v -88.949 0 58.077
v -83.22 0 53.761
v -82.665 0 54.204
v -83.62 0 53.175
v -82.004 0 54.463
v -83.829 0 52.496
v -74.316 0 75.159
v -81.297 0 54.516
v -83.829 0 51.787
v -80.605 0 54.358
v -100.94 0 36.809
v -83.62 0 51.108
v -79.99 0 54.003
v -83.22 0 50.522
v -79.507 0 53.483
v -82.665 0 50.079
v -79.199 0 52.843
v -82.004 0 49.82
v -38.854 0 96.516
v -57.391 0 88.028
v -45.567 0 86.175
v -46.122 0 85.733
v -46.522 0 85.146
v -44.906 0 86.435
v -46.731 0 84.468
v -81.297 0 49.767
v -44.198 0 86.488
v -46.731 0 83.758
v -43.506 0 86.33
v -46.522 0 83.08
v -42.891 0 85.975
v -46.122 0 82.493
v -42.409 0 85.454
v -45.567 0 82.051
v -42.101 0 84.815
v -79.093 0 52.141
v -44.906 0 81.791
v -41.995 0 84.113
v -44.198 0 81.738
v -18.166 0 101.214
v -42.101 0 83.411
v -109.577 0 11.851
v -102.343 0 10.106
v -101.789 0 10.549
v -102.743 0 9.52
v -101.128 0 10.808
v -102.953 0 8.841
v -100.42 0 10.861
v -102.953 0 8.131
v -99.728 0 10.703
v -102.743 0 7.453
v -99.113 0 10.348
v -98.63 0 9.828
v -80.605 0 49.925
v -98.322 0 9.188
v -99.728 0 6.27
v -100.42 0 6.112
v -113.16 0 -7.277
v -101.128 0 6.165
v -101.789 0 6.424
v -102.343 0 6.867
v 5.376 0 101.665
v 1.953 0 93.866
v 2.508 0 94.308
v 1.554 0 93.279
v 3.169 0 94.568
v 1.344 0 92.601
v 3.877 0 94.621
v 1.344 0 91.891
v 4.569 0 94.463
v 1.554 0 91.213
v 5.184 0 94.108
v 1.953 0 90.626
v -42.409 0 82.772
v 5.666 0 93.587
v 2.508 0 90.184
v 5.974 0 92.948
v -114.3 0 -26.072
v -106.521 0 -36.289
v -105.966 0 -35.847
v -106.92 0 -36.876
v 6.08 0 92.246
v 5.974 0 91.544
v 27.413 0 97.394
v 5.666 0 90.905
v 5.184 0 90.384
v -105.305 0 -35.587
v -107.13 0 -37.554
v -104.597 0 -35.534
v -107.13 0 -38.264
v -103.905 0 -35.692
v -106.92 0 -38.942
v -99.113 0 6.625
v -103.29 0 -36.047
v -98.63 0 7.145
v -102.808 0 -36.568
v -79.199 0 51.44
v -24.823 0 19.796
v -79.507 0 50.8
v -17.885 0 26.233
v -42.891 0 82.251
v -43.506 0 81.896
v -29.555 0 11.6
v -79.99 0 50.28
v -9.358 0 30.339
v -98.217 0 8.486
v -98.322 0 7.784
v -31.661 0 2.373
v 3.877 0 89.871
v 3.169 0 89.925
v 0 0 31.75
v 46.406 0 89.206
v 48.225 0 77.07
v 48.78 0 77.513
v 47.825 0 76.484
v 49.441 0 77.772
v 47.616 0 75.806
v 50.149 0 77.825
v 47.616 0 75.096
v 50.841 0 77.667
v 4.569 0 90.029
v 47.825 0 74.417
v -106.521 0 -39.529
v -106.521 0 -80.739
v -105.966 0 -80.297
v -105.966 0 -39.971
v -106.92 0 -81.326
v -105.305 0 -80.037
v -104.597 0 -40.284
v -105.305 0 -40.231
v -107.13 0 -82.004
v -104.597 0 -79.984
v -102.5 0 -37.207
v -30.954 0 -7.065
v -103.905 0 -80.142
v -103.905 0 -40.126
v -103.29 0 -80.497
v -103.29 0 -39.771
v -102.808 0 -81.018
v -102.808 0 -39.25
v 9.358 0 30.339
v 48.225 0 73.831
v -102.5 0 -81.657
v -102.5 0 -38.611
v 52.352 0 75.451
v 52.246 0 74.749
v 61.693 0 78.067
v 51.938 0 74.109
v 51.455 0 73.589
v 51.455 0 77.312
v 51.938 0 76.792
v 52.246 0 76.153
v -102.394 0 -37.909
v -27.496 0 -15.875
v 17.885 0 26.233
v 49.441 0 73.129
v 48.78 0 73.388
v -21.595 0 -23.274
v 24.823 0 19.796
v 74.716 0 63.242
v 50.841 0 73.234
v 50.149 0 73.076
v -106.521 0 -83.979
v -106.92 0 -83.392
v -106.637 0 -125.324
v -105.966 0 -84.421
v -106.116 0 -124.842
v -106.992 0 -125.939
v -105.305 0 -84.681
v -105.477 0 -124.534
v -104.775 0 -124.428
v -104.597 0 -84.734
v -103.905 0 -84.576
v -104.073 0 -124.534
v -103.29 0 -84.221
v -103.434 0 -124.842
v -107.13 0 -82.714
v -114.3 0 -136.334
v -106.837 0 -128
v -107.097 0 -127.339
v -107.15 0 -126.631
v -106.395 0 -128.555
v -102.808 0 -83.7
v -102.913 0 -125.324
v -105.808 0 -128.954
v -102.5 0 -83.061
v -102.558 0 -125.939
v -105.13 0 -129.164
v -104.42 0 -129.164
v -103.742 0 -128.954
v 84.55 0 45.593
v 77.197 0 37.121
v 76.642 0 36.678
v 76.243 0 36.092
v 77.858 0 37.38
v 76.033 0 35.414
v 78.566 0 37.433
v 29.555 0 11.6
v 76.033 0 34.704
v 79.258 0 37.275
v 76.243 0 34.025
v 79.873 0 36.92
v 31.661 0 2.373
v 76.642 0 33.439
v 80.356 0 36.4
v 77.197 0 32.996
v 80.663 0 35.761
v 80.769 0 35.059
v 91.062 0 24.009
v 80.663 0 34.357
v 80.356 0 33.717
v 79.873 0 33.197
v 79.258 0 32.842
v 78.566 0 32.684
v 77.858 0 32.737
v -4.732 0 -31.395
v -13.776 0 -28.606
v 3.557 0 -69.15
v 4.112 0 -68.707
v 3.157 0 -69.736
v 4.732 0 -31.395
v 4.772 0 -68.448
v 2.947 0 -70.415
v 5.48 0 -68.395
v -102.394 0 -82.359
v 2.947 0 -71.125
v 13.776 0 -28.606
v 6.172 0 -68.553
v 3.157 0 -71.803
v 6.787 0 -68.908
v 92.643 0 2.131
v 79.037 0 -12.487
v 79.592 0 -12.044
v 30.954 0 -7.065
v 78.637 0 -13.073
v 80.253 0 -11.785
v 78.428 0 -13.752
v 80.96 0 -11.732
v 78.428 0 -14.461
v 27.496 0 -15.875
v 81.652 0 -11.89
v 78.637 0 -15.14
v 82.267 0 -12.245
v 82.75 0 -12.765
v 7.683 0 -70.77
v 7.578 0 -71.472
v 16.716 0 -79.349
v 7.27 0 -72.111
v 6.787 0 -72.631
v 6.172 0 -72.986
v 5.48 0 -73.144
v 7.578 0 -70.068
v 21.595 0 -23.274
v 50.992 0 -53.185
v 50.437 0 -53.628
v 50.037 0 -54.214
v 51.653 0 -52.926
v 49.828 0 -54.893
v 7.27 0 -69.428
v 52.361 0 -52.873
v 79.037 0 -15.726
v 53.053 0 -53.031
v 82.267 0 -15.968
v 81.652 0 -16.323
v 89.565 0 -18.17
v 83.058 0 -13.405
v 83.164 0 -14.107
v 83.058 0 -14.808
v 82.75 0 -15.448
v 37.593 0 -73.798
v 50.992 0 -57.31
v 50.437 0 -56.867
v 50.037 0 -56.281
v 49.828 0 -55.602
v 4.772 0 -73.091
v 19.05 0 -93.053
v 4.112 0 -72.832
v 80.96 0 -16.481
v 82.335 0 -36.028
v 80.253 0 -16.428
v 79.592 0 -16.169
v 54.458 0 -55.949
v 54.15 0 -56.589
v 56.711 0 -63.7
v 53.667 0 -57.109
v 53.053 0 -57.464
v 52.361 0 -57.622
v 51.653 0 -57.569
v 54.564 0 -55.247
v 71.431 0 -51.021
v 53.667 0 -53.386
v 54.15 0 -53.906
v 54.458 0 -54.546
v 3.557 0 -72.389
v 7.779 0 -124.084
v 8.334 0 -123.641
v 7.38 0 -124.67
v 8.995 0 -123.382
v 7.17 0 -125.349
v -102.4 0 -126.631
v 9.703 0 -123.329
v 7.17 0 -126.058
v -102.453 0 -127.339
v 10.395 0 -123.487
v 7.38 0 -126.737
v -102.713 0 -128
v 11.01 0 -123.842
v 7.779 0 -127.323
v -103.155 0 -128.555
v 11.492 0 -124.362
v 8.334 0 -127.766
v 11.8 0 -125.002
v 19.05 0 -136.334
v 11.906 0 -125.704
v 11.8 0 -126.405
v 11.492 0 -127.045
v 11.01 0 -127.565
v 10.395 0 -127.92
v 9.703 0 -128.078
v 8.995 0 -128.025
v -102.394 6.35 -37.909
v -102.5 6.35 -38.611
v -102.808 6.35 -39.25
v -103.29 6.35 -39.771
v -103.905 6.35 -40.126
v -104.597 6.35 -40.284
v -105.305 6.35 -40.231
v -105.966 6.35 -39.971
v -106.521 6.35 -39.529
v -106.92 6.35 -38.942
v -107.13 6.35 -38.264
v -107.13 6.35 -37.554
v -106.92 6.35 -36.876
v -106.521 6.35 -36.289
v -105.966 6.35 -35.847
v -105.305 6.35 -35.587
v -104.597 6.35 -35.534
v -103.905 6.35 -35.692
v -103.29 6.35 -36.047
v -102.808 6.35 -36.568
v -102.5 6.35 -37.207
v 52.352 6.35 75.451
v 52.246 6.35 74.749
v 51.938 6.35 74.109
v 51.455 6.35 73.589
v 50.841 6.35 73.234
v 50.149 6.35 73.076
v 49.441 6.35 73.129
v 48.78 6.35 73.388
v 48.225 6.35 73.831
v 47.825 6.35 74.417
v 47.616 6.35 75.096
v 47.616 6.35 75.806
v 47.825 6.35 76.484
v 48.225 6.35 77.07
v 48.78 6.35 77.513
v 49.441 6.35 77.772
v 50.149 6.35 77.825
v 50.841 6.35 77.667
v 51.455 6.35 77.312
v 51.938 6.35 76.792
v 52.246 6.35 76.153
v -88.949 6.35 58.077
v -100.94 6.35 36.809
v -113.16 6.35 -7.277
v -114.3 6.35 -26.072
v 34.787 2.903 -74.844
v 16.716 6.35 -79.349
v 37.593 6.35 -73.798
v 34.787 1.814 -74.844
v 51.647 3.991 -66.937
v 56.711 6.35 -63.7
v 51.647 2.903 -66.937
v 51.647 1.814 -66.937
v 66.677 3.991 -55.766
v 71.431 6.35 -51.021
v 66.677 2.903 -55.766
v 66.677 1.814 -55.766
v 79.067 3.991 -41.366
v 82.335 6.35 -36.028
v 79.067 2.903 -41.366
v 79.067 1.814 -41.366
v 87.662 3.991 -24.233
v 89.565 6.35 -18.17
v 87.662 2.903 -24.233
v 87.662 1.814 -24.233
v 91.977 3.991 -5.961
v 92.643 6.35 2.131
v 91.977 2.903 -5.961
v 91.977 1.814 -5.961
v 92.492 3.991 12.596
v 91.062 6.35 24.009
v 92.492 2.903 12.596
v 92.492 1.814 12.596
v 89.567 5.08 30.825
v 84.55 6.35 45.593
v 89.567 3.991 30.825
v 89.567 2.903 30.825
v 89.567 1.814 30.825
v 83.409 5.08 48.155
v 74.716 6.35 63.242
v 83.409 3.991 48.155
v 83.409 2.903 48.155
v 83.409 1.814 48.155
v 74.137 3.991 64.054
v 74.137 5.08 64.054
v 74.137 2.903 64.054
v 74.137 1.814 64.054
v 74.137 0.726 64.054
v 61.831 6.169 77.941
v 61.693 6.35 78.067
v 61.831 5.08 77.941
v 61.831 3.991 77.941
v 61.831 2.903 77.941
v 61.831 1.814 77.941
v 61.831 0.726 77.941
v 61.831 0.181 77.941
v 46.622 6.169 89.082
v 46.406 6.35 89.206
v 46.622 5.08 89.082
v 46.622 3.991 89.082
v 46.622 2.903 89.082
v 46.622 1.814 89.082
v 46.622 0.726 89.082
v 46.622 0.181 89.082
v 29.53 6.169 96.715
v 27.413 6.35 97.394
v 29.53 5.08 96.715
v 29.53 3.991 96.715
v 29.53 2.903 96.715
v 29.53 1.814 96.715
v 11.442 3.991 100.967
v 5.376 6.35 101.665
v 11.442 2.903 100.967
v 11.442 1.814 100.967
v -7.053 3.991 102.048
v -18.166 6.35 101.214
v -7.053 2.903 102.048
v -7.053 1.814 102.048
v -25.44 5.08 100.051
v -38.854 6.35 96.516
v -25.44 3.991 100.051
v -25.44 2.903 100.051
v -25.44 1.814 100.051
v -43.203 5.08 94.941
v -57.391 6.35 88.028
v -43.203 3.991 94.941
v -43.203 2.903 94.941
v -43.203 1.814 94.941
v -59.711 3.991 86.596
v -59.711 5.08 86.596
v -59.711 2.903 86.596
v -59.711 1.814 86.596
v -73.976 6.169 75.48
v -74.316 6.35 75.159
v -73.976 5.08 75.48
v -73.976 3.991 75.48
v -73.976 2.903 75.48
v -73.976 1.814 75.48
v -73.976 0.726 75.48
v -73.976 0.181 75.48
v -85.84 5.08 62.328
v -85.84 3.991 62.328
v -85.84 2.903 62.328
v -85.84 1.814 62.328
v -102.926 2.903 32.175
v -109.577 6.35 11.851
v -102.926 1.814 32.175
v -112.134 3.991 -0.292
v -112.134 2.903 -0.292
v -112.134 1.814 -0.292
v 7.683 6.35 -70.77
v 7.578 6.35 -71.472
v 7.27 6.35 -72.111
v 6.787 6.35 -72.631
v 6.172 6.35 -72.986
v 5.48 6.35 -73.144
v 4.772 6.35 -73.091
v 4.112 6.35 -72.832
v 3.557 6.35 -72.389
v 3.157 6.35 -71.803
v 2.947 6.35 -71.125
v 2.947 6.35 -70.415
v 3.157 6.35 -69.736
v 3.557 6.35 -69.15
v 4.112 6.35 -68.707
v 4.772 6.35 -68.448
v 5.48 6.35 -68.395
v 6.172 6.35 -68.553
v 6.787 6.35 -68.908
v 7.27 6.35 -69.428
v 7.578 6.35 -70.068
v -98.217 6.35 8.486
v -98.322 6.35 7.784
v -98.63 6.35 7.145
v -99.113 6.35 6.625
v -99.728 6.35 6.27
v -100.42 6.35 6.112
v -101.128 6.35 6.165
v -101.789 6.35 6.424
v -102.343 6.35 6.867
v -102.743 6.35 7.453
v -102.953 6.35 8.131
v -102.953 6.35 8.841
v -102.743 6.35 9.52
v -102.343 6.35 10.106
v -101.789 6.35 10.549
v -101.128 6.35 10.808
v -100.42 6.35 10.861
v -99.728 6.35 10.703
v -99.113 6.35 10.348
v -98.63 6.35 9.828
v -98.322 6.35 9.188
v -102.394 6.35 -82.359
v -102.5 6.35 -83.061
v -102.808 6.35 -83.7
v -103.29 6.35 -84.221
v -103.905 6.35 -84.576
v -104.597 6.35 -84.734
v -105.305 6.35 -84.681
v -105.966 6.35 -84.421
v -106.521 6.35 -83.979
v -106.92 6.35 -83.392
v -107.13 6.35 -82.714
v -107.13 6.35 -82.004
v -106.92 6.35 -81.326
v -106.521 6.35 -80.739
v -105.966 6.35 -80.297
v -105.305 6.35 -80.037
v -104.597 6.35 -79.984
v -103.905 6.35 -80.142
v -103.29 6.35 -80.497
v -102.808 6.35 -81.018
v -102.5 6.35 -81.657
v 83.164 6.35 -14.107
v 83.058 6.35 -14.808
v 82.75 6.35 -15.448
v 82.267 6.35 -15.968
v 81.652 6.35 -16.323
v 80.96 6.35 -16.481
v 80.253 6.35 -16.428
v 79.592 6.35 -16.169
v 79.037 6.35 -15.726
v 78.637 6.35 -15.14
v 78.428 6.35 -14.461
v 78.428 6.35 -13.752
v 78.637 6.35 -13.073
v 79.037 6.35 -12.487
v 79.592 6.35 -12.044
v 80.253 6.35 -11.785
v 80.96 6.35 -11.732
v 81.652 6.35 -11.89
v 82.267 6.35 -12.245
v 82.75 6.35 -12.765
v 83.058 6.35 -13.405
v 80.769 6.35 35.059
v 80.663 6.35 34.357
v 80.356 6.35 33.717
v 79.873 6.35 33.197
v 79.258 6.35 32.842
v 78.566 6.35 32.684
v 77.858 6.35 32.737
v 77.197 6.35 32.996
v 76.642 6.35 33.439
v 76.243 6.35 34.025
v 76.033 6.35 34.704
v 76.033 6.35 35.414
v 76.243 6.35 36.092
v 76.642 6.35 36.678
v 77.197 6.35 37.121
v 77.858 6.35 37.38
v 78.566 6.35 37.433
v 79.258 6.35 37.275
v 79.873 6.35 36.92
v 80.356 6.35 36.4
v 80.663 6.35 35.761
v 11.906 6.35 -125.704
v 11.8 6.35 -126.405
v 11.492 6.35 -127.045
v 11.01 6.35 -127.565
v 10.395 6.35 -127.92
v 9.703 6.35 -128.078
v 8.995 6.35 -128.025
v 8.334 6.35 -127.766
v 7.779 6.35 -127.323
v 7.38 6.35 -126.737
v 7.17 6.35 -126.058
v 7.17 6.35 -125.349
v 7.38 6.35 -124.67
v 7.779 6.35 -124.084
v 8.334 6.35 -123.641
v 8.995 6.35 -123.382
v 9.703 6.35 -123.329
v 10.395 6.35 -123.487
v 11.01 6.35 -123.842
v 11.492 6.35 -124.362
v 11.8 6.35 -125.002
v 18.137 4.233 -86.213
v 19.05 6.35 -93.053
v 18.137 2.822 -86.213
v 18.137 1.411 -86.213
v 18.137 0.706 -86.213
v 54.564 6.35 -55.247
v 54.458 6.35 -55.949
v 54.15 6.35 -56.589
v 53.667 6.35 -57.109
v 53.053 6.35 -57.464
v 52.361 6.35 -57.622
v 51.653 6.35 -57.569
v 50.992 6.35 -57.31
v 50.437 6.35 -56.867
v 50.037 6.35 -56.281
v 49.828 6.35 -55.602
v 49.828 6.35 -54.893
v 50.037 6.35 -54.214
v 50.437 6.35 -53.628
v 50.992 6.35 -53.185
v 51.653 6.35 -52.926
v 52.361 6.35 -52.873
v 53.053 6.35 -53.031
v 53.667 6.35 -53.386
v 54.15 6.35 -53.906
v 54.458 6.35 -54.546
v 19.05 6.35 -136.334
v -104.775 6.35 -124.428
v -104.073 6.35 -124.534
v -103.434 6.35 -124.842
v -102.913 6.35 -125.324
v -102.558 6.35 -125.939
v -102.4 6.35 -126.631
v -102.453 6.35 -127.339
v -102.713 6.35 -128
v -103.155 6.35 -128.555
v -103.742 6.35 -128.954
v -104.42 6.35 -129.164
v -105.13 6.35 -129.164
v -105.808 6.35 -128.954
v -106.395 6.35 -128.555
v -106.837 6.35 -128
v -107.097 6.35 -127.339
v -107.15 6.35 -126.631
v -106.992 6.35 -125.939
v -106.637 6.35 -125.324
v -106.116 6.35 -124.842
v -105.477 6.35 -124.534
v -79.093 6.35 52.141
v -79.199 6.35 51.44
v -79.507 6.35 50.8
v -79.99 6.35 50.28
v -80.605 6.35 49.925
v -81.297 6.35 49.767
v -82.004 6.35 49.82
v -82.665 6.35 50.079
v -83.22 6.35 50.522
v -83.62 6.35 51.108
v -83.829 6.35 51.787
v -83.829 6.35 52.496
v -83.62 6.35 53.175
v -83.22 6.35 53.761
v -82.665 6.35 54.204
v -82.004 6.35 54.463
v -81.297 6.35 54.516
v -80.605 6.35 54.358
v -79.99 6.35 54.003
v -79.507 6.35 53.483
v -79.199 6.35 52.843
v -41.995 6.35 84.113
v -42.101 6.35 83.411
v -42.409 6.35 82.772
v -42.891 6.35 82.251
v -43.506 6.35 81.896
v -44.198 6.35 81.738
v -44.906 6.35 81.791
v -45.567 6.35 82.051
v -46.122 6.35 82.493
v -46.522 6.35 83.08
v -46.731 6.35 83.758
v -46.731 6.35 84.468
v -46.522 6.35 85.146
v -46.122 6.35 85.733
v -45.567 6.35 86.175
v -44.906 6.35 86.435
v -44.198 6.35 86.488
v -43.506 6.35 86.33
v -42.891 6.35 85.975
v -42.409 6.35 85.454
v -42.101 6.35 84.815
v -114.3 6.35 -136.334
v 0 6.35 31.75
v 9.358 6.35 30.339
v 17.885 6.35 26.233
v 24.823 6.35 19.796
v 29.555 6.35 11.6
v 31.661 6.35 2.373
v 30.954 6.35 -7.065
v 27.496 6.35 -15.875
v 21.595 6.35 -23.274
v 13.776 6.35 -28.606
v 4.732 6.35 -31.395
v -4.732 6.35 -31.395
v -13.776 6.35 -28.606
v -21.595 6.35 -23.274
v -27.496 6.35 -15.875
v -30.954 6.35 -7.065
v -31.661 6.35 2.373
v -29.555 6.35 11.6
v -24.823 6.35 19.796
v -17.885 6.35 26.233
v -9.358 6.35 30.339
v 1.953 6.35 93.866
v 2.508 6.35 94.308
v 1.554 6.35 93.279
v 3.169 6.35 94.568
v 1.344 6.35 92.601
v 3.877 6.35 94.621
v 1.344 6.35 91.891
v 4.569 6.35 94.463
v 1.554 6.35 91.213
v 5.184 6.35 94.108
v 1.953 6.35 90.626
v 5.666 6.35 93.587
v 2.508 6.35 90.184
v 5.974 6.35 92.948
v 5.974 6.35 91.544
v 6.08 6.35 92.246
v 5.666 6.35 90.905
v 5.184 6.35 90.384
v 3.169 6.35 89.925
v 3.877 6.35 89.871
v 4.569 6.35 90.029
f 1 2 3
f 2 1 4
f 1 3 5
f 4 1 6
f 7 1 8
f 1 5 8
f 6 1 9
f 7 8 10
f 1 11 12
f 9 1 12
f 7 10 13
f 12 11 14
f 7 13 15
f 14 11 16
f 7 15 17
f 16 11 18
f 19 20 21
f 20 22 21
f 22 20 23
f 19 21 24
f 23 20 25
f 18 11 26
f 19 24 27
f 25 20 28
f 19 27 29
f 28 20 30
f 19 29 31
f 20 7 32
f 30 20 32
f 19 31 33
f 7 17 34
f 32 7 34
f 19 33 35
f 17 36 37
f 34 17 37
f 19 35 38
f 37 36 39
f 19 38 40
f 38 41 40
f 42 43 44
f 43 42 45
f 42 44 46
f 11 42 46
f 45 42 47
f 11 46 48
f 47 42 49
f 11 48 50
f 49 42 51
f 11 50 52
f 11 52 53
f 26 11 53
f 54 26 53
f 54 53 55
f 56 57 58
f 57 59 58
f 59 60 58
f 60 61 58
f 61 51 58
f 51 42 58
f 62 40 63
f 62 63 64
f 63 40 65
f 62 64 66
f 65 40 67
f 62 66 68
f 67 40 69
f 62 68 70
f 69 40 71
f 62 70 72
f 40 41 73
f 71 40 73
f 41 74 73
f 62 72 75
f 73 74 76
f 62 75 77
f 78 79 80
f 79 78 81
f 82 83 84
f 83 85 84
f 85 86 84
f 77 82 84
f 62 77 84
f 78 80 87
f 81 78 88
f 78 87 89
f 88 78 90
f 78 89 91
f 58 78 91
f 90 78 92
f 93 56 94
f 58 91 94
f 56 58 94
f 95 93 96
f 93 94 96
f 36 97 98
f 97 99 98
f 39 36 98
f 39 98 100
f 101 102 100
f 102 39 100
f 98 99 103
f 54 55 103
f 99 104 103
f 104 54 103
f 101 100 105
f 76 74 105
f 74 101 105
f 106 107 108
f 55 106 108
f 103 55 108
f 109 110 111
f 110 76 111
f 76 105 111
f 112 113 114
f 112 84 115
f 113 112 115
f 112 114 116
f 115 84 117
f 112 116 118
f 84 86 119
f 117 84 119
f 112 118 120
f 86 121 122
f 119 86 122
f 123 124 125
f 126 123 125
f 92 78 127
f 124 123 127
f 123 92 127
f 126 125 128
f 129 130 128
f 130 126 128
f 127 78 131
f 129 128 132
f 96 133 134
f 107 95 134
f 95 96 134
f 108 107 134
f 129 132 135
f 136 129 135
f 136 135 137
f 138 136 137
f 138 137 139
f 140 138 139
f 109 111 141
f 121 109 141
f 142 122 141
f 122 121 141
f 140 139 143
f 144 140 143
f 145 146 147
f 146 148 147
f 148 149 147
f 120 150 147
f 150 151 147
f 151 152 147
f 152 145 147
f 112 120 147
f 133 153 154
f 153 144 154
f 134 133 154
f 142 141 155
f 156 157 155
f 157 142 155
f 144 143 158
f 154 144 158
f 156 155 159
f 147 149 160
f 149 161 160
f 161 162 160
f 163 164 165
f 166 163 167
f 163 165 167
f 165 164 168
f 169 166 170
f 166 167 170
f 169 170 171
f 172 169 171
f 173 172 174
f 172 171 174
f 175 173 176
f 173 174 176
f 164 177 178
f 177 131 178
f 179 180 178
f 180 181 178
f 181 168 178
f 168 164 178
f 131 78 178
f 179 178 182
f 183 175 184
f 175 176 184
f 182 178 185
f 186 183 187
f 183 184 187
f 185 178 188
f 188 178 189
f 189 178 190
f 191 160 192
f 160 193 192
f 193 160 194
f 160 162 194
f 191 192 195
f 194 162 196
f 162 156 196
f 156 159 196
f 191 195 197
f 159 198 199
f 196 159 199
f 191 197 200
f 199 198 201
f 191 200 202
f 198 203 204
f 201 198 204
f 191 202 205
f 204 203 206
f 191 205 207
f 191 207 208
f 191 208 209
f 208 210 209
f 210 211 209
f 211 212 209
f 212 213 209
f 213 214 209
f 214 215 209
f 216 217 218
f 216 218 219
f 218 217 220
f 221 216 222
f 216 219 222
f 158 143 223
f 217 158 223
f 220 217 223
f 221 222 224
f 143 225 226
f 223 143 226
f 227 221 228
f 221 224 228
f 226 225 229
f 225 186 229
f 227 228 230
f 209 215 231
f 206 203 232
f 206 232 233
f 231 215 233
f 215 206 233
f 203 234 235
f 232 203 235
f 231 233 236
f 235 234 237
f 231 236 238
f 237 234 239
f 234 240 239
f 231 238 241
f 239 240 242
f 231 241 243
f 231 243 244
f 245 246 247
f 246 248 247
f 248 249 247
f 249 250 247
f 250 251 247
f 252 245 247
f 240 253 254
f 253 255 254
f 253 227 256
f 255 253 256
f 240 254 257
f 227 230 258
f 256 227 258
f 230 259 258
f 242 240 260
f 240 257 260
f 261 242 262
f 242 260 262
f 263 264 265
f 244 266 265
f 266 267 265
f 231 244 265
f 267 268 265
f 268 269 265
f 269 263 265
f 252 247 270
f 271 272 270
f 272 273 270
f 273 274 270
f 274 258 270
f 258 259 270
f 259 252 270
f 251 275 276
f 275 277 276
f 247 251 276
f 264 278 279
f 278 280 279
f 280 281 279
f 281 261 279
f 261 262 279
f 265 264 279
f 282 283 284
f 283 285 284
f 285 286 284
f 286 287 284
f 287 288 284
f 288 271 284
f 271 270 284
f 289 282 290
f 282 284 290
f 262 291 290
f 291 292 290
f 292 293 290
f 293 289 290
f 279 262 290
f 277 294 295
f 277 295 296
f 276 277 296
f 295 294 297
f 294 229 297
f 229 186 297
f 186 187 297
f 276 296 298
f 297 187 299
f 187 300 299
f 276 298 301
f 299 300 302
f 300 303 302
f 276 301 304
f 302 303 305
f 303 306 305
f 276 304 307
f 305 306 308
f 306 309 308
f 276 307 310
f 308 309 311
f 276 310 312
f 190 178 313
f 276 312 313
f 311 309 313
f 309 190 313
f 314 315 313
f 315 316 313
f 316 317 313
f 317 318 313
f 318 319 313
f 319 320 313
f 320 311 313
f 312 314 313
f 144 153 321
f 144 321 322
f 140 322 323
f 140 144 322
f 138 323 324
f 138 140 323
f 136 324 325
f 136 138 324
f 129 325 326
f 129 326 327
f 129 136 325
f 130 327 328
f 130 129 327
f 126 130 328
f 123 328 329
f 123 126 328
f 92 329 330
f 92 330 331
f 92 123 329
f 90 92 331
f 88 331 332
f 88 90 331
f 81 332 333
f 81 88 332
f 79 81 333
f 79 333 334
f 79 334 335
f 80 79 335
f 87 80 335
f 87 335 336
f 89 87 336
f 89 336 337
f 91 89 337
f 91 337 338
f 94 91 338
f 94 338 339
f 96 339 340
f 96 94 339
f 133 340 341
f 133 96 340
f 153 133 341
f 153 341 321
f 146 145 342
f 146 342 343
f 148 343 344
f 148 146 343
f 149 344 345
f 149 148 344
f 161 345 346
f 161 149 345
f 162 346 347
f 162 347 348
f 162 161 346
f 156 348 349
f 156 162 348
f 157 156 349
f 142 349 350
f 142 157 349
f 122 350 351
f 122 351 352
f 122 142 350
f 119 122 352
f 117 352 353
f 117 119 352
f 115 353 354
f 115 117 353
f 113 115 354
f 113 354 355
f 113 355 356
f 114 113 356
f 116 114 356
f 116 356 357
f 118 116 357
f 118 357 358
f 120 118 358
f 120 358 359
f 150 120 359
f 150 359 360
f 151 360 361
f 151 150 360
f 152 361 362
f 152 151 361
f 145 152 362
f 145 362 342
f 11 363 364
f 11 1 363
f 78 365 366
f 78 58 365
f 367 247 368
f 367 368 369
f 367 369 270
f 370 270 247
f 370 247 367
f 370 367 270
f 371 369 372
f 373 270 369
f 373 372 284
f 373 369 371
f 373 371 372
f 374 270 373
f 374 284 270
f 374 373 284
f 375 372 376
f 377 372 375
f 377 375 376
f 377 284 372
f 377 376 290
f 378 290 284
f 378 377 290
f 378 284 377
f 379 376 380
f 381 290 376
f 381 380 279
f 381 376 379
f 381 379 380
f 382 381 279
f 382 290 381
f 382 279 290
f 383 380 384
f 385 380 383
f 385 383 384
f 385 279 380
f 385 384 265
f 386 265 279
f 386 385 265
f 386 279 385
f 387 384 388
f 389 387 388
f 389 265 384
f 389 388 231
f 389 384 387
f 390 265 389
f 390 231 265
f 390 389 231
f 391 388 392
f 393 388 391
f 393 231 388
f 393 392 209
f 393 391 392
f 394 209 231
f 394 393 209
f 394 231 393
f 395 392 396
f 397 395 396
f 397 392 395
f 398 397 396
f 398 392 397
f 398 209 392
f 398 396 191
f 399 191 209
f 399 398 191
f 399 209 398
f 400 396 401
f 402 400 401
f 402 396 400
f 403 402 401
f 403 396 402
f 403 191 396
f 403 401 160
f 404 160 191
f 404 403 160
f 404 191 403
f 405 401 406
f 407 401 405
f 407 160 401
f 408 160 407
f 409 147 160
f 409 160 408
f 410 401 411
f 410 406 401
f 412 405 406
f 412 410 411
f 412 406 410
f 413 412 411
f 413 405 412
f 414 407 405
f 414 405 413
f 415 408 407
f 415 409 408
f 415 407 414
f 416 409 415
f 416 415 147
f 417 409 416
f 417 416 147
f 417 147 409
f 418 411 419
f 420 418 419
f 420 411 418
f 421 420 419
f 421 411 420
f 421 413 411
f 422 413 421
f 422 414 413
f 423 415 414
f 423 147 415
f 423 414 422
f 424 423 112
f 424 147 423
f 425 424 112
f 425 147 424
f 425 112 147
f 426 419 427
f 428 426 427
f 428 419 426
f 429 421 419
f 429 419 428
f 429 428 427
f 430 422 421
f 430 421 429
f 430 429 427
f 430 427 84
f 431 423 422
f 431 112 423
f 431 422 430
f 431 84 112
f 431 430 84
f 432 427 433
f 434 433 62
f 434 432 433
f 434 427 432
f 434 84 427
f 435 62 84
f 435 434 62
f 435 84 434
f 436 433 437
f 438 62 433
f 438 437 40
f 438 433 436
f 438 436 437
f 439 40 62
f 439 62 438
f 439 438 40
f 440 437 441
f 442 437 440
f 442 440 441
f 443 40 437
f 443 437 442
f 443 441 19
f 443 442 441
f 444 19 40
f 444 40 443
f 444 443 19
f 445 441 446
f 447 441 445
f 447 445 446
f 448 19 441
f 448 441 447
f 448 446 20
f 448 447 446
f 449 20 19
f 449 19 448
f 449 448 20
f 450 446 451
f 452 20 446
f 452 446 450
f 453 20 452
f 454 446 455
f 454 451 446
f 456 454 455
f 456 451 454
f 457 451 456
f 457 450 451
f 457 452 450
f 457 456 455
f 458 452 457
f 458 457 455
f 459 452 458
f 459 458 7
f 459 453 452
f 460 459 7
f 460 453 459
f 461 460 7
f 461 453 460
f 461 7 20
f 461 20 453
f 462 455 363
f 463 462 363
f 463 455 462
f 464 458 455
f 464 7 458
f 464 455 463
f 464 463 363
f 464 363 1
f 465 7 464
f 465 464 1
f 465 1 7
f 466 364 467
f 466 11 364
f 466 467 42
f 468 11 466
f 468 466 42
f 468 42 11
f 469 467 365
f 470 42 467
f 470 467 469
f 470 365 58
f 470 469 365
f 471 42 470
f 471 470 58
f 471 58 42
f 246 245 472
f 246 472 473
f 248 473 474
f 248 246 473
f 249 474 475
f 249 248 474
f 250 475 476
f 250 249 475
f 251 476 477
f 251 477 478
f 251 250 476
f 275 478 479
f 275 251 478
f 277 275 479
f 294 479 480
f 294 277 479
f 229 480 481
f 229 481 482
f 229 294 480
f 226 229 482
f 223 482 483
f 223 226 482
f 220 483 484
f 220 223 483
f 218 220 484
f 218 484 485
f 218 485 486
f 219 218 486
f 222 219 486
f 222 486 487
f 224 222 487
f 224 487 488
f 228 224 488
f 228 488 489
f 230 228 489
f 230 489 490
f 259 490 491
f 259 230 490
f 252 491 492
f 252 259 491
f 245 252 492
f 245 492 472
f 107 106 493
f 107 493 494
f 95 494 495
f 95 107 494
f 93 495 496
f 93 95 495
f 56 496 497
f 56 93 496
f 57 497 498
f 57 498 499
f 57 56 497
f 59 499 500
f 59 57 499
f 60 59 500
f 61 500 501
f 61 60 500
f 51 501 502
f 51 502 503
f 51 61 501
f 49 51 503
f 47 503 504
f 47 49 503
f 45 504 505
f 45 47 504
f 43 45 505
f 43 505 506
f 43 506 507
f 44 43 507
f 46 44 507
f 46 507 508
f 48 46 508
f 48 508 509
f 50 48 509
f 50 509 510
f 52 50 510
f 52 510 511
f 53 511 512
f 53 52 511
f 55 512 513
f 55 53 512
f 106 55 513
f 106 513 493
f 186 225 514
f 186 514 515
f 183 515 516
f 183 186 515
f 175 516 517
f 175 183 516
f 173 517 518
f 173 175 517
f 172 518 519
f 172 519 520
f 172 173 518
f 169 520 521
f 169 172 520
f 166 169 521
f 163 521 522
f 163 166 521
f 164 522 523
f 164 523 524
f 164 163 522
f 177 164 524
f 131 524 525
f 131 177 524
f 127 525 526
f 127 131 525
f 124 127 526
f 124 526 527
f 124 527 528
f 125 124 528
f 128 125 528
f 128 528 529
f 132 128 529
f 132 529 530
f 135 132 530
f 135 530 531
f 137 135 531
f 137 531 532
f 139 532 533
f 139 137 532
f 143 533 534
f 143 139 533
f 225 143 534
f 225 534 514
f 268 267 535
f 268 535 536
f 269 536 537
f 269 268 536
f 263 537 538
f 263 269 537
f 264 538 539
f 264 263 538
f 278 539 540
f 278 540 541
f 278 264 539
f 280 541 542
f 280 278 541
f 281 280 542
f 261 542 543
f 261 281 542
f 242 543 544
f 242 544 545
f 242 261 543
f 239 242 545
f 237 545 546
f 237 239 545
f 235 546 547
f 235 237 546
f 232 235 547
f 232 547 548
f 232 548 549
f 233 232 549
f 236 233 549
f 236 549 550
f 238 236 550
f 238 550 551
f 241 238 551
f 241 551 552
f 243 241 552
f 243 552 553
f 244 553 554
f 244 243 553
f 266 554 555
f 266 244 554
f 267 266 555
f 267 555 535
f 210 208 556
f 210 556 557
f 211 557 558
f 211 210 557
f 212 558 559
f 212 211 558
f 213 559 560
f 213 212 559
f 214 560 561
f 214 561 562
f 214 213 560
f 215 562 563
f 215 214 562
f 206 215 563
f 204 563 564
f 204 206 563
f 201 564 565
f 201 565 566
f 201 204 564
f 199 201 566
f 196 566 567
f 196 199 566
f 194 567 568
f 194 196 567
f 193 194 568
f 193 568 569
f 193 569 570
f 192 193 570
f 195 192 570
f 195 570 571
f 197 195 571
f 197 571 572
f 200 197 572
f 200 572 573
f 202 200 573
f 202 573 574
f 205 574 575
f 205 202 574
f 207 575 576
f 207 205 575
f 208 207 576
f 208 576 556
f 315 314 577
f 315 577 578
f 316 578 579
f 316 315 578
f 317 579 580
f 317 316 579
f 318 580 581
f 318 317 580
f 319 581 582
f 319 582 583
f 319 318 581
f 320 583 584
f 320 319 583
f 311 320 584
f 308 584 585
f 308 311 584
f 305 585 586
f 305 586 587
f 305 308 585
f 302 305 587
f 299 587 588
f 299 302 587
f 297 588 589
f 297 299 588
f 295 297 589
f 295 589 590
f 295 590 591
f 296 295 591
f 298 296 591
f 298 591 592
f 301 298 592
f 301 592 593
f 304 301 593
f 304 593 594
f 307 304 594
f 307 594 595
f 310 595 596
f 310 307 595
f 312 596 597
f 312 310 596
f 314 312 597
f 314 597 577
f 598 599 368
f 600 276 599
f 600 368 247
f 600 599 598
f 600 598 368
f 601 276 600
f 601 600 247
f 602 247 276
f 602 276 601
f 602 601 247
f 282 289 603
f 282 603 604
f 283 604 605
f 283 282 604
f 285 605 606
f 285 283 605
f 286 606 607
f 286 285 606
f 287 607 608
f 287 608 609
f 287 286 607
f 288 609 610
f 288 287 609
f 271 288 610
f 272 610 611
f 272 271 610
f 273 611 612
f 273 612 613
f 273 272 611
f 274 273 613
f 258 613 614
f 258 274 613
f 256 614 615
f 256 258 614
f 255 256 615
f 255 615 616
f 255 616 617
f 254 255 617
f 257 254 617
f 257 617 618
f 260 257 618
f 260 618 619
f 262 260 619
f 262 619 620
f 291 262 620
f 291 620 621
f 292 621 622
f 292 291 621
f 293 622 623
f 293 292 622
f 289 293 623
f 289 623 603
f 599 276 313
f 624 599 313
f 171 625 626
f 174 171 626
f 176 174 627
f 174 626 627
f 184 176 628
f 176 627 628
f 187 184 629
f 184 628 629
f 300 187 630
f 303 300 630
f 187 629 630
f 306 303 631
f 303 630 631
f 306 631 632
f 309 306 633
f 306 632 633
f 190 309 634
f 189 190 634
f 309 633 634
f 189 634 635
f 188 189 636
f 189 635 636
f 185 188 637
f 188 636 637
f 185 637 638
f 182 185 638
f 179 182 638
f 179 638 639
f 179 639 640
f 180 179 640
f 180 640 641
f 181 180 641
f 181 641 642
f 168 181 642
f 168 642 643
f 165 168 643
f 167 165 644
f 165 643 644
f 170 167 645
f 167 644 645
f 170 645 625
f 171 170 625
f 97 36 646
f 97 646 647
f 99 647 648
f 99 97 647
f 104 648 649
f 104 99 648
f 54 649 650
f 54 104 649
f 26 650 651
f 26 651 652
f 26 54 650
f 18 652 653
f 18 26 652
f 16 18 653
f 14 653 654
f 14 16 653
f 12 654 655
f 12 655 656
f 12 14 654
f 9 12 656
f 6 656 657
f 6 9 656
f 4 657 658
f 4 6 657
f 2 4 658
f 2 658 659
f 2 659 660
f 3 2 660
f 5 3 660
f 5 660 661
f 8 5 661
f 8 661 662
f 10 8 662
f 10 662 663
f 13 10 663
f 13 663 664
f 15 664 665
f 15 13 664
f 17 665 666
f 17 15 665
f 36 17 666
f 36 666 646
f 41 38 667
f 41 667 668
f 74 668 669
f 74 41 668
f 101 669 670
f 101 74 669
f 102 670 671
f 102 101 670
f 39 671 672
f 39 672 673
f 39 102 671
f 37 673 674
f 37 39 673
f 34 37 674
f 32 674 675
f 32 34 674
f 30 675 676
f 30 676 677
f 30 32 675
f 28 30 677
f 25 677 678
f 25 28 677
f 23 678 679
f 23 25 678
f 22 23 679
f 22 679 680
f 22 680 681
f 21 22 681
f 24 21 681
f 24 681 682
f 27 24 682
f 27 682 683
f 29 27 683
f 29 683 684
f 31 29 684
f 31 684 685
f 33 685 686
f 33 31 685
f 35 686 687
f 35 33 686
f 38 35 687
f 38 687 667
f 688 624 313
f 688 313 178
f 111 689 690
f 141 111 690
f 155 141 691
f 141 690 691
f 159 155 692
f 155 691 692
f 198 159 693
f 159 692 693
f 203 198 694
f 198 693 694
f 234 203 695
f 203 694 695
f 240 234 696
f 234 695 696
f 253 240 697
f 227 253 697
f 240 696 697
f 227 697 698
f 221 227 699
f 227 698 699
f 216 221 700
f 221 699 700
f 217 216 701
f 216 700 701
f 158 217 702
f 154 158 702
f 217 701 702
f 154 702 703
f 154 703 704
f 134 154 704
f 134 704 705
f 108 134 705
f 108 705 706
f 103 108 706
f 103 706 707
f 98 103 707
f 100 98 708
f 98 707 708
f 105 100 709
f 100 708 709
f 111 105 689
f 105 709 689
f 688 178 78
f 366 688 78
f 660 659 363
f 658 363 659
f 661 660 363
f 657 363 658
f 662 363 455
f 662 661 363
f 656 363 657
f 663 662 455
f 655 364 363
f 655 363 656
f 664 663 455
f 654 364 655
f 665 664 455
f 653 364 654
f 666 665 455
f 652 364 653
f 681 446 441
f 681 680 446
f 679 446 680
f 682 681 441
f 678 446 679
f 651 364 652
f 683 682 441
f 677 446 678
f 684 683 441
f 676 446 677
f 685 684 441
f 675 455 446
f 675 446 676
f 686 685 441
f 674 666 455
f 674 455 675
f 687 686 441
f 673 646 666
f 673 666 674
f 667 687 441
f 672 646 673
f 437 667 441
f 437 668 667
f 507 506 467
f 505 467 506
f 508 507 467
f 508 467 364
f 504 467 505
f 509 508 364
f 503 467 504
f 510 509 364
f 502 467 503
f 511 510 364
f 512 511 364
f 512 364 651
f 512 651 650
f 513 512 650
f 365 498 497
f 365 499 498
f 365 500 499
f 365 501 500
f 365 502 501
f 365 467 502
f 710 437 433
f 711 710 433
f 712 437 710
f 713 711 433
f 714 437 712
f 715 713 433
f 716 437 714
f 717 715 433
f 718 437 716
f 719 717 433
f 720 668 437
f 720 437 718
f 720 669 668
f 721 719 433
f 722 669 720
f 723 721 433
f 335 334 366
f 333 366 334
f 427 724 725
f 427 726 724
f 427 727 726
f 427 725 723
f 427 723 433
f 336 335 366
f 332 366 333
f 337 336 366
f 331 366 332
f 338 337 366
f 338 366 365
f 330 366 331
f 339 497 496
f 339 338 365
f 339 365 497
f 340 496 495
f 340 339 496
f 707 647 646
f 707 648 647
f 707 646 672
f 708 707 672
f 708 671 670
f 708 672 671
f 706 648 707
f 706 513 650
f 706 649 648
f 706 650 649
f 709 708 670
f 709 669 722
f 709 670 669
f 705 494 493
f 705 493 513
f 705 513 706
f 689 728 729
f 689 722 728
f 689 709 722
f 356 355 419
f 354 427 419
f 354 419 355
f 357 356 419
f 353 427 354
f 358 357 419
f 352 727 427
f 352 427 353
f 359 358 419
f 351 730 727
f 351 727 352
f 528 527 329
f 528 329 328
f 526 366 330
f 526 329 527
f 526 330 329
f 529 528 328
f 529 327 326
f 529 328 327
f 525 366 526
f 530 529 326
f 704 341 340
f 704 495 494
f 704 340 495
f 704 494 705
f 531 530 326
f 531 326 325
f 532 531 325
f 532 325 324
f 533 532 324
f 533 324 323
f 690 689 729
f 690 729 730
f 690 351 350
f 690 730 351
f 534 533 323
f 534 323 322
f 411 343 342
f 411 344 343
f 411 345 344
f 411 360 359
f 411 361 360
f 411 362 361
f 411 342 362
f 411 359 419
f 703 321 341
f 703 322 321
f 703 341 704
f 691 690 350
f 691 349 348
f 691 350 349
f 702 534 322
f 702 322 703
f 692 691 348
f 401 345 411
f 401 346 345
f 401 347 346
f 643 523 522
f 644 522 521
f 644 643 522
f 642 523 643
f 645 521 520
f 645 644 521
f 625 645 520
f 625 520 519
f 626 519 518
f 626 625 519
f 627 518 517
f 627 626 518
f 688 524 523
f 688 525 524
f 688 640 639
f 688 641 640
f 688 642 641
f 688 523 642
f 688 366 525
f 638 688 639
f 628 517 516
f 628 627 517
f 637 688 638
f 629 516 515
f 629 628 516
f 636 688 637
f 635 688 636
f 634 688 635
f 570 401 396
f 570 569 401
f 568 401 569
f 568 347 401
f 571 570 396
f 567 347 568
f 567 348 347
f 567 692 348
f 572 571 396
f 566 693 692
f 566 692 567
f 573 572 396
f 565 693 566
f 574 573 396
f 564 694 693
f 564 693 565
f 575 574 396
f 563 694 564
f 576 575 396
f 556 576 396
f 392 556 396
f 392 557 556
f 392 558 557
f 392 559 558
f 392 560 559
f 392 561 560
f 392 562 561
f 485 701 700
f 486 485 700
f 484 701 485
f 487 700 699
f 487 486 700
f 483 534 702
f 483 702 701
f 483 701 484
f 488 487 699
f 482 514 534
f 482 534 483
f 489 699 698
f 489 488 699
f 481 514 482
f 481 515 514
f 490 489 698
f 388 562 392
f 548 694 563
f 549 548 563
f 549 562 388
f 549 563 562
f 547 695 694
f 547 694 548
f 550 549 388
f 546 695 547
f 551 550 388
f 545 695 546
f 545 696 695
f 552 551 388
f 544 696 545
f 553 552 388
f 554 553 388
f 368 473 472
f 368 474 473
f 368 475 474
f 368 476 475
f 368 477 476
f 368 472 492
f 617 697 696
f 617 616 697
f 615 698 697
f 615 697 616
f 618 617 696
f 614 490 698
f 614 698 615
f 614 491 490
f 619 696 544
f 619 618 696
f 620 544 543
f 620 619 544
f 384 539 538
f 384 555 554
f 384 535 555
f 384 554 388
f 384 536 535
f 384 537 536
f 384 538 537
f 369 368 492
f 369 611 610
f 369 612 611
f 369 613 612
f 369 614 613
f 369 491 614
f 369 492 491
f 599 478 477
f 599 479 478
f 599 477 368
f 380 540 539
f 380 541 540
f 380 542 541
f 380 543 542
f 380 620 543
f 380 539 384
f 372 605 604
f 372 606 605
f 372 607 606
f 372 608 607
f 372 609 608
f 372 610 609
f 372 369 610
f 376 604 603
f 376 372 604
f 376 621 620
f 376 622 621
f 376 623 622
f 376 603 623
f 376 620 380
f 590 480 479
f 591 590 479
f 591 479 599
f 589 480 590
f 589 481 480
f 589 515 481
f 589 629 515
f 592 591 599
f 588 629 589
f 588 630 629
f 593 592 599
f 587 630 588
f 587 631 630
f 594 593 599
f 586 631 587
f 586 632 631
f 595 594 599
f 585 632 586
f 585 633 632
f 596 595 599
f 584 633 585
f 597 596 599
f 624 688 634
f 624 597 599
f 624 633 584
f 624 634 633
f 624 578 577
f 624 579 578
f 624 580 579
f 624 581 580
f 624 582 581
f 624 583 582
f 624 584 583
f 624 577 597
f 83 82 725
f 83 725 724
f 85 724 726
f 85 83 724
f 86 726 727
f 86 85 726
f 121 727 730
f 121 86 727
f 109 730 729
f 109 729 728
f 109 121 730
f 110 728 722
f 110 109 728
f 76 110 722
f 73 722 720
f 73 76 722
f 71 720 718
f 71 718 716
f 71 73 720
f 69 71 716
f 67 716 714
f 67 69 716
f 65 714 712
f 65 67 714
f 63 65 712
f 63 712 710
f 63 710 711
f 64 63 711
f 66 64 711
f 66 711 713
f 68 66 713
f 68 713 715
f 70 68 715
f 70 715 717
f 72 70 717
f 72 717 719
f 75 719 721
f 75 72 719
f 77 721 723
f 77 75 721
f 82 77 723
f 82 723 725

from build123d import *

# Parameters (mm, degrees)
BOSS_EXTRUDE1_DEPTH   = 6.35
FILLET1_R             = 2.54
FILLET2_R             = 0.79375
SKETCH4_R             = 2.38125
CUT_EXTRUDE3_DEPTH    = 6.35
CRVPATTERN1_OUTLINE_R = 2.38125
CRVPATTERN1_DEPTH     = 6.35
SKETCH5_R             = 31.75
BOSS_EXTRUDE2_DEPTH   = 6.35


# Read off the part's stored shape, not the designer's step: CrvPattern1
with BuildPart() as part:
    # Sketch1 → Boss-Extrude1 (new body)
    with BuildSketch(Plane(origin=(0, 0, 0), x_dir=(1, 0, 0), z_dir=(0, 1, 0))):
        with BuildLine():
            Line((0, 136.334024978), (0, 94.083801247))
            add(Edge.make_bspline(
                [(0, 94.083801247), (-2.431386336, 71.693275709), (-15.75825593, 58.230430146)],
                knots=[0, 0, 0, 1, 1, 1], degree=2))
            add(Edge.make_bspline(
                [(-15.75825593, 58.230430146), (12.928997408, 67.764135595), (70.60122301, 46.247103047), (77.540383798, -26.213493844), (40.518788725, -85.775261158), (-67.055108572, -88.304279922), (-95.415707681, -10.214485927), (-95.25, 26.030170649)],
                knots=[0, 0, 0, 0, 0.227546357, 0.356849793, 0.49581236, 0.710996888, 1, 1, 1, 1], degree=3))
            Line((-95.25, 26.030170649), (-95.25, 136.334024978))
            Line((-95.25, 136.334024978), (-114.3, 136.334024978))
            Line((-114.3, 136.334024978), (-114.3, 26.072111228))
            add(Edge.make_bspline(
                [(16.715986391, 79.348568009), (21.633097871, 78.62719896), (31.371857261, 76.389721894), (45.249200497, 70.845276961), (58.14270202, 63.202354702), (69.694268499, 53.486594004), (77.831645881, 43.678743898), (83.1663553, 34.778326042), (87.500656656, 25.500338712), (91.157064432, 13.400044888), (92.998924079, -1.463666218), (92.533158628, -16.332160856), (89.911348046, -30.922868008), (85.224669703, -44.926534482), (78.5424766, -58.087321563), (69.892966554, -70.128088223), (59.334225085, -80.722518946), (46.808294676, -89.48437896), (33.165750854, -95.831204537), (18.8220758, -100.00043745), (4.083822861, -102.101602424), (-10.777441223, -102.219799961), (-25.504851136, -100.381408636), (-37.452741503, -97.197322494), (-46.66563909, -93.622653994), (-53.378233983, -90.404269128), (-59.778019163, -86.667831837), (-67.772964247, -81.11349497), (-76.794838317, -73.191996697), (-86.082507199, -62.480245978), (-96.526865188, -46.978935087), (-104.24741081, -30.151640125), (-109.53383183, -12.800694626), (-112.324631517, 0.306051107), (-113.698273493, 11.158780223), (-114.231429958, 19.740893087), (-114.308990648, 23.9549561), (-114.3, 26.072111228)],
                knots=[0.074418032, 0.074418032, 0.074418032, 0.074418032, 0.103339233, 0.132260434, 0.161181635, 0.190102836, 0.219024037, 0.233484638, 0.247945239, 0.27686644, 0.305787641, 0.334708842, 0.363630043, 0.392551244, 0.421472445, 0.450393647, 0.479314848, 0.508236049, 0.53715725, 0.566078451, 0.594999652, 0.623920853, 0.652842055, 0.681763256, 0.696223856, 0.710684457, 0.725145057, 0.739605658, 0.768526859, 0.79744806, 0.826369261, 0.884211664, 0.913132865, 0.942054066, 0.970975267, 0.985435868, 0.999896468, 0.999896468, 0.999896468, 0.999896468], degree=3))
            add(Edge.make_bspline(
                [(19.05, 93.052513121), (19.023571763, 92.809136693), (18.983692868, 92.443089224), (18.931467162, 91.958957236), (18.862360798, 91.337915751), (18.776292871, 90.610780885), (18.625902721, 89.42512839), (18.420122868, 87.959858448), (18.049990563, 85.627575808), (17.510143571, 82.743597147), (16.996105499, 80.478464636), (16.715986391, 79.348568009)],
                knots=[-0.022894974, -0.022894974, -0.022894974, -0.022894974, -0.006590549, 0.001561663, 0.009713876, 0.0260183, 0.042322725, 0.074931575, 0.107540425, 0.172758125, 0.237975825, 0.237975825, 0.237975825, 0.237975825], degree=3))
            Line((19.05, 93.052513121), (19.05, 136.334024978))
            Line((19.05, 136.334024978), (0, 136.334024978))
        make_face()
    extrude(amount=BOSS_EXTRUDE1_DEPTH)

    # Fillet1
    fillet1_edges = [part.edges().sort_by_distance(p)[0] for p in [
        (0, 3.175, -94.083801247),
        (-95.25, 3.175, -26.030170649),
    ]]
    fillet(fillet1_edges, radius=FILLET1_R)

    # Fillet2
    fillet2_edges = [part.edges().sort_by_distance(p)[0] for p in [
        (-15.75825593, 3.175, -58.230430146),
    ]]
    fillet(fillet2_edges, radius=FILLET2_R)

    # Sketch4 → Cut-Extrude3 (cut)
    with BuildSketch(Plane(origin=(0, 6.35, 0), x_dir=(1, 0, 0), z_dir=(0, 1, 0))):
        with Locations(Location((-104.775, 126.809024978, 0), (0, 0, 270))):
            Circle(SKETCH4_R)
    extrude(amount=-CUT_EXTRUDE3_DEPTH, mode=Mode.SUBTRACT)

    # CrvPattern1 outline → CrvPattern1 (cut)
    with BuildSketch(Plane(origin=(0, 0, 0), x_dir=(1, 0, 0), z_dir=(0, 1, 0))):
        with Locations((-104.775, 82.359024978)):
            Circle(CRVPATTERN1_OUTLINE_R)
        with Locations((-104.775, 37.909024978)):
            Circle(CRVPATTERN1_OUTLINE_R)
        with Locations((-100.597903535, -8.486356178)):
            Circle(CRVPATTERN1_OUTLINE_R)
        with Locations((-81.474554, -52.141471765)):
            Circle(CRVPATTERN1_OUTLINE_R)
        with Locations((-44.376132313, -84.112983027)):
            Circle(CRVPATTERN1_OUTLINE_R)
        with Locations((3.698987105, -92.246074321)):
            Circle(CRVPATTERN1_OUTLINE_R)
        with Locations((49.97064989, -75.450636534)):
            Circle(CRVPATTERN1_OUTLINE_R)
        with Locations((78.388040736, -35.058632959)):
            Circle(CRVPATTERN1_OUTLINE_R)
        with Locations((80.782414242, 14.106535639)):
            Circle(CRVPATTERN1_OUTLINE_R)
        with Locations((52.182738061, 55.247486043)):
            Circle(CRVPATTERN1_OUTLINE_R)
        with Locations((5.302146984, 70.7696737)):
            Circle(CRVPATTERN1_OUTLINE_R)
        with Locations((9.525, 125.703541591)):
            Circle(CRVPATTERN1_OUTLINE_R)
    extrude(amount=CRVPATTERN1_DEPTH, mode=Mode.SUBTRACT)

    # Sketch5 → Boss-Extrude2 (add)
    with BuildSketch(Plane(origin=(0, 6.35, 0), x_dir=(1, 0, 0), z_dir=(0, 1, 0))):
        with BuildLine():
            Line((0, 94.222341016), (0, 136.334024978))
            Line((0, 136.334024978), (-95.25, 136.334024978))
            Line((-95.25, 136.334024978), (-95.25, 26.035946481))
            Line((-95.25, 26.035946481), (-95.250025994, 26.02445519))
            add(Edge.make_bspline(
                [(-95.250025994, 26.02445519), (-95.413998653, -10.219191455), (-67.052567731, -88.304220188), (40.518788725, -85.775261158), (77.540383798, -26.213493844), (70.704250586, 45.171261183), (15.28602209, 66.863348491), (-12.949636793, 59.083069401)],
                knots=[1.5191e-05, 1.5191e-05, 1.5191e-05, 1.5191e-05, 0.289003112, 0.50418764, 0.643150207, 0.772453643, 0.992638541, 0.992638541, 0.992638541, 0.992638541], degree=3))
            ThreePointArc((-12.949636793, 59.083069401), (-13.833627454, 59.427668219), (-13.755858665, 60.373257902))
            add(Edge.make_bspline(
                [(-13.755858665, 60.373257902), (-2.2817326, 73.386271149), (-0.015296893, 93.943999106)],
                knots=[0, 0, 0, 1, 1, 1], degree=2))
            ThreePointArc((-0.015296893, 93.943999106), (-0.003827106, 94.082960051), (0, 94.222341016))
        make_face()
        with Locations(Location((0, 0, 0), (0, 0, 270))):
            Circle(SKETCH5_R, mode=Mode.SUBTRACT)
    extrude(amount=-BOSS_EXTRUDE2_DEPTH)


solid = part.part
